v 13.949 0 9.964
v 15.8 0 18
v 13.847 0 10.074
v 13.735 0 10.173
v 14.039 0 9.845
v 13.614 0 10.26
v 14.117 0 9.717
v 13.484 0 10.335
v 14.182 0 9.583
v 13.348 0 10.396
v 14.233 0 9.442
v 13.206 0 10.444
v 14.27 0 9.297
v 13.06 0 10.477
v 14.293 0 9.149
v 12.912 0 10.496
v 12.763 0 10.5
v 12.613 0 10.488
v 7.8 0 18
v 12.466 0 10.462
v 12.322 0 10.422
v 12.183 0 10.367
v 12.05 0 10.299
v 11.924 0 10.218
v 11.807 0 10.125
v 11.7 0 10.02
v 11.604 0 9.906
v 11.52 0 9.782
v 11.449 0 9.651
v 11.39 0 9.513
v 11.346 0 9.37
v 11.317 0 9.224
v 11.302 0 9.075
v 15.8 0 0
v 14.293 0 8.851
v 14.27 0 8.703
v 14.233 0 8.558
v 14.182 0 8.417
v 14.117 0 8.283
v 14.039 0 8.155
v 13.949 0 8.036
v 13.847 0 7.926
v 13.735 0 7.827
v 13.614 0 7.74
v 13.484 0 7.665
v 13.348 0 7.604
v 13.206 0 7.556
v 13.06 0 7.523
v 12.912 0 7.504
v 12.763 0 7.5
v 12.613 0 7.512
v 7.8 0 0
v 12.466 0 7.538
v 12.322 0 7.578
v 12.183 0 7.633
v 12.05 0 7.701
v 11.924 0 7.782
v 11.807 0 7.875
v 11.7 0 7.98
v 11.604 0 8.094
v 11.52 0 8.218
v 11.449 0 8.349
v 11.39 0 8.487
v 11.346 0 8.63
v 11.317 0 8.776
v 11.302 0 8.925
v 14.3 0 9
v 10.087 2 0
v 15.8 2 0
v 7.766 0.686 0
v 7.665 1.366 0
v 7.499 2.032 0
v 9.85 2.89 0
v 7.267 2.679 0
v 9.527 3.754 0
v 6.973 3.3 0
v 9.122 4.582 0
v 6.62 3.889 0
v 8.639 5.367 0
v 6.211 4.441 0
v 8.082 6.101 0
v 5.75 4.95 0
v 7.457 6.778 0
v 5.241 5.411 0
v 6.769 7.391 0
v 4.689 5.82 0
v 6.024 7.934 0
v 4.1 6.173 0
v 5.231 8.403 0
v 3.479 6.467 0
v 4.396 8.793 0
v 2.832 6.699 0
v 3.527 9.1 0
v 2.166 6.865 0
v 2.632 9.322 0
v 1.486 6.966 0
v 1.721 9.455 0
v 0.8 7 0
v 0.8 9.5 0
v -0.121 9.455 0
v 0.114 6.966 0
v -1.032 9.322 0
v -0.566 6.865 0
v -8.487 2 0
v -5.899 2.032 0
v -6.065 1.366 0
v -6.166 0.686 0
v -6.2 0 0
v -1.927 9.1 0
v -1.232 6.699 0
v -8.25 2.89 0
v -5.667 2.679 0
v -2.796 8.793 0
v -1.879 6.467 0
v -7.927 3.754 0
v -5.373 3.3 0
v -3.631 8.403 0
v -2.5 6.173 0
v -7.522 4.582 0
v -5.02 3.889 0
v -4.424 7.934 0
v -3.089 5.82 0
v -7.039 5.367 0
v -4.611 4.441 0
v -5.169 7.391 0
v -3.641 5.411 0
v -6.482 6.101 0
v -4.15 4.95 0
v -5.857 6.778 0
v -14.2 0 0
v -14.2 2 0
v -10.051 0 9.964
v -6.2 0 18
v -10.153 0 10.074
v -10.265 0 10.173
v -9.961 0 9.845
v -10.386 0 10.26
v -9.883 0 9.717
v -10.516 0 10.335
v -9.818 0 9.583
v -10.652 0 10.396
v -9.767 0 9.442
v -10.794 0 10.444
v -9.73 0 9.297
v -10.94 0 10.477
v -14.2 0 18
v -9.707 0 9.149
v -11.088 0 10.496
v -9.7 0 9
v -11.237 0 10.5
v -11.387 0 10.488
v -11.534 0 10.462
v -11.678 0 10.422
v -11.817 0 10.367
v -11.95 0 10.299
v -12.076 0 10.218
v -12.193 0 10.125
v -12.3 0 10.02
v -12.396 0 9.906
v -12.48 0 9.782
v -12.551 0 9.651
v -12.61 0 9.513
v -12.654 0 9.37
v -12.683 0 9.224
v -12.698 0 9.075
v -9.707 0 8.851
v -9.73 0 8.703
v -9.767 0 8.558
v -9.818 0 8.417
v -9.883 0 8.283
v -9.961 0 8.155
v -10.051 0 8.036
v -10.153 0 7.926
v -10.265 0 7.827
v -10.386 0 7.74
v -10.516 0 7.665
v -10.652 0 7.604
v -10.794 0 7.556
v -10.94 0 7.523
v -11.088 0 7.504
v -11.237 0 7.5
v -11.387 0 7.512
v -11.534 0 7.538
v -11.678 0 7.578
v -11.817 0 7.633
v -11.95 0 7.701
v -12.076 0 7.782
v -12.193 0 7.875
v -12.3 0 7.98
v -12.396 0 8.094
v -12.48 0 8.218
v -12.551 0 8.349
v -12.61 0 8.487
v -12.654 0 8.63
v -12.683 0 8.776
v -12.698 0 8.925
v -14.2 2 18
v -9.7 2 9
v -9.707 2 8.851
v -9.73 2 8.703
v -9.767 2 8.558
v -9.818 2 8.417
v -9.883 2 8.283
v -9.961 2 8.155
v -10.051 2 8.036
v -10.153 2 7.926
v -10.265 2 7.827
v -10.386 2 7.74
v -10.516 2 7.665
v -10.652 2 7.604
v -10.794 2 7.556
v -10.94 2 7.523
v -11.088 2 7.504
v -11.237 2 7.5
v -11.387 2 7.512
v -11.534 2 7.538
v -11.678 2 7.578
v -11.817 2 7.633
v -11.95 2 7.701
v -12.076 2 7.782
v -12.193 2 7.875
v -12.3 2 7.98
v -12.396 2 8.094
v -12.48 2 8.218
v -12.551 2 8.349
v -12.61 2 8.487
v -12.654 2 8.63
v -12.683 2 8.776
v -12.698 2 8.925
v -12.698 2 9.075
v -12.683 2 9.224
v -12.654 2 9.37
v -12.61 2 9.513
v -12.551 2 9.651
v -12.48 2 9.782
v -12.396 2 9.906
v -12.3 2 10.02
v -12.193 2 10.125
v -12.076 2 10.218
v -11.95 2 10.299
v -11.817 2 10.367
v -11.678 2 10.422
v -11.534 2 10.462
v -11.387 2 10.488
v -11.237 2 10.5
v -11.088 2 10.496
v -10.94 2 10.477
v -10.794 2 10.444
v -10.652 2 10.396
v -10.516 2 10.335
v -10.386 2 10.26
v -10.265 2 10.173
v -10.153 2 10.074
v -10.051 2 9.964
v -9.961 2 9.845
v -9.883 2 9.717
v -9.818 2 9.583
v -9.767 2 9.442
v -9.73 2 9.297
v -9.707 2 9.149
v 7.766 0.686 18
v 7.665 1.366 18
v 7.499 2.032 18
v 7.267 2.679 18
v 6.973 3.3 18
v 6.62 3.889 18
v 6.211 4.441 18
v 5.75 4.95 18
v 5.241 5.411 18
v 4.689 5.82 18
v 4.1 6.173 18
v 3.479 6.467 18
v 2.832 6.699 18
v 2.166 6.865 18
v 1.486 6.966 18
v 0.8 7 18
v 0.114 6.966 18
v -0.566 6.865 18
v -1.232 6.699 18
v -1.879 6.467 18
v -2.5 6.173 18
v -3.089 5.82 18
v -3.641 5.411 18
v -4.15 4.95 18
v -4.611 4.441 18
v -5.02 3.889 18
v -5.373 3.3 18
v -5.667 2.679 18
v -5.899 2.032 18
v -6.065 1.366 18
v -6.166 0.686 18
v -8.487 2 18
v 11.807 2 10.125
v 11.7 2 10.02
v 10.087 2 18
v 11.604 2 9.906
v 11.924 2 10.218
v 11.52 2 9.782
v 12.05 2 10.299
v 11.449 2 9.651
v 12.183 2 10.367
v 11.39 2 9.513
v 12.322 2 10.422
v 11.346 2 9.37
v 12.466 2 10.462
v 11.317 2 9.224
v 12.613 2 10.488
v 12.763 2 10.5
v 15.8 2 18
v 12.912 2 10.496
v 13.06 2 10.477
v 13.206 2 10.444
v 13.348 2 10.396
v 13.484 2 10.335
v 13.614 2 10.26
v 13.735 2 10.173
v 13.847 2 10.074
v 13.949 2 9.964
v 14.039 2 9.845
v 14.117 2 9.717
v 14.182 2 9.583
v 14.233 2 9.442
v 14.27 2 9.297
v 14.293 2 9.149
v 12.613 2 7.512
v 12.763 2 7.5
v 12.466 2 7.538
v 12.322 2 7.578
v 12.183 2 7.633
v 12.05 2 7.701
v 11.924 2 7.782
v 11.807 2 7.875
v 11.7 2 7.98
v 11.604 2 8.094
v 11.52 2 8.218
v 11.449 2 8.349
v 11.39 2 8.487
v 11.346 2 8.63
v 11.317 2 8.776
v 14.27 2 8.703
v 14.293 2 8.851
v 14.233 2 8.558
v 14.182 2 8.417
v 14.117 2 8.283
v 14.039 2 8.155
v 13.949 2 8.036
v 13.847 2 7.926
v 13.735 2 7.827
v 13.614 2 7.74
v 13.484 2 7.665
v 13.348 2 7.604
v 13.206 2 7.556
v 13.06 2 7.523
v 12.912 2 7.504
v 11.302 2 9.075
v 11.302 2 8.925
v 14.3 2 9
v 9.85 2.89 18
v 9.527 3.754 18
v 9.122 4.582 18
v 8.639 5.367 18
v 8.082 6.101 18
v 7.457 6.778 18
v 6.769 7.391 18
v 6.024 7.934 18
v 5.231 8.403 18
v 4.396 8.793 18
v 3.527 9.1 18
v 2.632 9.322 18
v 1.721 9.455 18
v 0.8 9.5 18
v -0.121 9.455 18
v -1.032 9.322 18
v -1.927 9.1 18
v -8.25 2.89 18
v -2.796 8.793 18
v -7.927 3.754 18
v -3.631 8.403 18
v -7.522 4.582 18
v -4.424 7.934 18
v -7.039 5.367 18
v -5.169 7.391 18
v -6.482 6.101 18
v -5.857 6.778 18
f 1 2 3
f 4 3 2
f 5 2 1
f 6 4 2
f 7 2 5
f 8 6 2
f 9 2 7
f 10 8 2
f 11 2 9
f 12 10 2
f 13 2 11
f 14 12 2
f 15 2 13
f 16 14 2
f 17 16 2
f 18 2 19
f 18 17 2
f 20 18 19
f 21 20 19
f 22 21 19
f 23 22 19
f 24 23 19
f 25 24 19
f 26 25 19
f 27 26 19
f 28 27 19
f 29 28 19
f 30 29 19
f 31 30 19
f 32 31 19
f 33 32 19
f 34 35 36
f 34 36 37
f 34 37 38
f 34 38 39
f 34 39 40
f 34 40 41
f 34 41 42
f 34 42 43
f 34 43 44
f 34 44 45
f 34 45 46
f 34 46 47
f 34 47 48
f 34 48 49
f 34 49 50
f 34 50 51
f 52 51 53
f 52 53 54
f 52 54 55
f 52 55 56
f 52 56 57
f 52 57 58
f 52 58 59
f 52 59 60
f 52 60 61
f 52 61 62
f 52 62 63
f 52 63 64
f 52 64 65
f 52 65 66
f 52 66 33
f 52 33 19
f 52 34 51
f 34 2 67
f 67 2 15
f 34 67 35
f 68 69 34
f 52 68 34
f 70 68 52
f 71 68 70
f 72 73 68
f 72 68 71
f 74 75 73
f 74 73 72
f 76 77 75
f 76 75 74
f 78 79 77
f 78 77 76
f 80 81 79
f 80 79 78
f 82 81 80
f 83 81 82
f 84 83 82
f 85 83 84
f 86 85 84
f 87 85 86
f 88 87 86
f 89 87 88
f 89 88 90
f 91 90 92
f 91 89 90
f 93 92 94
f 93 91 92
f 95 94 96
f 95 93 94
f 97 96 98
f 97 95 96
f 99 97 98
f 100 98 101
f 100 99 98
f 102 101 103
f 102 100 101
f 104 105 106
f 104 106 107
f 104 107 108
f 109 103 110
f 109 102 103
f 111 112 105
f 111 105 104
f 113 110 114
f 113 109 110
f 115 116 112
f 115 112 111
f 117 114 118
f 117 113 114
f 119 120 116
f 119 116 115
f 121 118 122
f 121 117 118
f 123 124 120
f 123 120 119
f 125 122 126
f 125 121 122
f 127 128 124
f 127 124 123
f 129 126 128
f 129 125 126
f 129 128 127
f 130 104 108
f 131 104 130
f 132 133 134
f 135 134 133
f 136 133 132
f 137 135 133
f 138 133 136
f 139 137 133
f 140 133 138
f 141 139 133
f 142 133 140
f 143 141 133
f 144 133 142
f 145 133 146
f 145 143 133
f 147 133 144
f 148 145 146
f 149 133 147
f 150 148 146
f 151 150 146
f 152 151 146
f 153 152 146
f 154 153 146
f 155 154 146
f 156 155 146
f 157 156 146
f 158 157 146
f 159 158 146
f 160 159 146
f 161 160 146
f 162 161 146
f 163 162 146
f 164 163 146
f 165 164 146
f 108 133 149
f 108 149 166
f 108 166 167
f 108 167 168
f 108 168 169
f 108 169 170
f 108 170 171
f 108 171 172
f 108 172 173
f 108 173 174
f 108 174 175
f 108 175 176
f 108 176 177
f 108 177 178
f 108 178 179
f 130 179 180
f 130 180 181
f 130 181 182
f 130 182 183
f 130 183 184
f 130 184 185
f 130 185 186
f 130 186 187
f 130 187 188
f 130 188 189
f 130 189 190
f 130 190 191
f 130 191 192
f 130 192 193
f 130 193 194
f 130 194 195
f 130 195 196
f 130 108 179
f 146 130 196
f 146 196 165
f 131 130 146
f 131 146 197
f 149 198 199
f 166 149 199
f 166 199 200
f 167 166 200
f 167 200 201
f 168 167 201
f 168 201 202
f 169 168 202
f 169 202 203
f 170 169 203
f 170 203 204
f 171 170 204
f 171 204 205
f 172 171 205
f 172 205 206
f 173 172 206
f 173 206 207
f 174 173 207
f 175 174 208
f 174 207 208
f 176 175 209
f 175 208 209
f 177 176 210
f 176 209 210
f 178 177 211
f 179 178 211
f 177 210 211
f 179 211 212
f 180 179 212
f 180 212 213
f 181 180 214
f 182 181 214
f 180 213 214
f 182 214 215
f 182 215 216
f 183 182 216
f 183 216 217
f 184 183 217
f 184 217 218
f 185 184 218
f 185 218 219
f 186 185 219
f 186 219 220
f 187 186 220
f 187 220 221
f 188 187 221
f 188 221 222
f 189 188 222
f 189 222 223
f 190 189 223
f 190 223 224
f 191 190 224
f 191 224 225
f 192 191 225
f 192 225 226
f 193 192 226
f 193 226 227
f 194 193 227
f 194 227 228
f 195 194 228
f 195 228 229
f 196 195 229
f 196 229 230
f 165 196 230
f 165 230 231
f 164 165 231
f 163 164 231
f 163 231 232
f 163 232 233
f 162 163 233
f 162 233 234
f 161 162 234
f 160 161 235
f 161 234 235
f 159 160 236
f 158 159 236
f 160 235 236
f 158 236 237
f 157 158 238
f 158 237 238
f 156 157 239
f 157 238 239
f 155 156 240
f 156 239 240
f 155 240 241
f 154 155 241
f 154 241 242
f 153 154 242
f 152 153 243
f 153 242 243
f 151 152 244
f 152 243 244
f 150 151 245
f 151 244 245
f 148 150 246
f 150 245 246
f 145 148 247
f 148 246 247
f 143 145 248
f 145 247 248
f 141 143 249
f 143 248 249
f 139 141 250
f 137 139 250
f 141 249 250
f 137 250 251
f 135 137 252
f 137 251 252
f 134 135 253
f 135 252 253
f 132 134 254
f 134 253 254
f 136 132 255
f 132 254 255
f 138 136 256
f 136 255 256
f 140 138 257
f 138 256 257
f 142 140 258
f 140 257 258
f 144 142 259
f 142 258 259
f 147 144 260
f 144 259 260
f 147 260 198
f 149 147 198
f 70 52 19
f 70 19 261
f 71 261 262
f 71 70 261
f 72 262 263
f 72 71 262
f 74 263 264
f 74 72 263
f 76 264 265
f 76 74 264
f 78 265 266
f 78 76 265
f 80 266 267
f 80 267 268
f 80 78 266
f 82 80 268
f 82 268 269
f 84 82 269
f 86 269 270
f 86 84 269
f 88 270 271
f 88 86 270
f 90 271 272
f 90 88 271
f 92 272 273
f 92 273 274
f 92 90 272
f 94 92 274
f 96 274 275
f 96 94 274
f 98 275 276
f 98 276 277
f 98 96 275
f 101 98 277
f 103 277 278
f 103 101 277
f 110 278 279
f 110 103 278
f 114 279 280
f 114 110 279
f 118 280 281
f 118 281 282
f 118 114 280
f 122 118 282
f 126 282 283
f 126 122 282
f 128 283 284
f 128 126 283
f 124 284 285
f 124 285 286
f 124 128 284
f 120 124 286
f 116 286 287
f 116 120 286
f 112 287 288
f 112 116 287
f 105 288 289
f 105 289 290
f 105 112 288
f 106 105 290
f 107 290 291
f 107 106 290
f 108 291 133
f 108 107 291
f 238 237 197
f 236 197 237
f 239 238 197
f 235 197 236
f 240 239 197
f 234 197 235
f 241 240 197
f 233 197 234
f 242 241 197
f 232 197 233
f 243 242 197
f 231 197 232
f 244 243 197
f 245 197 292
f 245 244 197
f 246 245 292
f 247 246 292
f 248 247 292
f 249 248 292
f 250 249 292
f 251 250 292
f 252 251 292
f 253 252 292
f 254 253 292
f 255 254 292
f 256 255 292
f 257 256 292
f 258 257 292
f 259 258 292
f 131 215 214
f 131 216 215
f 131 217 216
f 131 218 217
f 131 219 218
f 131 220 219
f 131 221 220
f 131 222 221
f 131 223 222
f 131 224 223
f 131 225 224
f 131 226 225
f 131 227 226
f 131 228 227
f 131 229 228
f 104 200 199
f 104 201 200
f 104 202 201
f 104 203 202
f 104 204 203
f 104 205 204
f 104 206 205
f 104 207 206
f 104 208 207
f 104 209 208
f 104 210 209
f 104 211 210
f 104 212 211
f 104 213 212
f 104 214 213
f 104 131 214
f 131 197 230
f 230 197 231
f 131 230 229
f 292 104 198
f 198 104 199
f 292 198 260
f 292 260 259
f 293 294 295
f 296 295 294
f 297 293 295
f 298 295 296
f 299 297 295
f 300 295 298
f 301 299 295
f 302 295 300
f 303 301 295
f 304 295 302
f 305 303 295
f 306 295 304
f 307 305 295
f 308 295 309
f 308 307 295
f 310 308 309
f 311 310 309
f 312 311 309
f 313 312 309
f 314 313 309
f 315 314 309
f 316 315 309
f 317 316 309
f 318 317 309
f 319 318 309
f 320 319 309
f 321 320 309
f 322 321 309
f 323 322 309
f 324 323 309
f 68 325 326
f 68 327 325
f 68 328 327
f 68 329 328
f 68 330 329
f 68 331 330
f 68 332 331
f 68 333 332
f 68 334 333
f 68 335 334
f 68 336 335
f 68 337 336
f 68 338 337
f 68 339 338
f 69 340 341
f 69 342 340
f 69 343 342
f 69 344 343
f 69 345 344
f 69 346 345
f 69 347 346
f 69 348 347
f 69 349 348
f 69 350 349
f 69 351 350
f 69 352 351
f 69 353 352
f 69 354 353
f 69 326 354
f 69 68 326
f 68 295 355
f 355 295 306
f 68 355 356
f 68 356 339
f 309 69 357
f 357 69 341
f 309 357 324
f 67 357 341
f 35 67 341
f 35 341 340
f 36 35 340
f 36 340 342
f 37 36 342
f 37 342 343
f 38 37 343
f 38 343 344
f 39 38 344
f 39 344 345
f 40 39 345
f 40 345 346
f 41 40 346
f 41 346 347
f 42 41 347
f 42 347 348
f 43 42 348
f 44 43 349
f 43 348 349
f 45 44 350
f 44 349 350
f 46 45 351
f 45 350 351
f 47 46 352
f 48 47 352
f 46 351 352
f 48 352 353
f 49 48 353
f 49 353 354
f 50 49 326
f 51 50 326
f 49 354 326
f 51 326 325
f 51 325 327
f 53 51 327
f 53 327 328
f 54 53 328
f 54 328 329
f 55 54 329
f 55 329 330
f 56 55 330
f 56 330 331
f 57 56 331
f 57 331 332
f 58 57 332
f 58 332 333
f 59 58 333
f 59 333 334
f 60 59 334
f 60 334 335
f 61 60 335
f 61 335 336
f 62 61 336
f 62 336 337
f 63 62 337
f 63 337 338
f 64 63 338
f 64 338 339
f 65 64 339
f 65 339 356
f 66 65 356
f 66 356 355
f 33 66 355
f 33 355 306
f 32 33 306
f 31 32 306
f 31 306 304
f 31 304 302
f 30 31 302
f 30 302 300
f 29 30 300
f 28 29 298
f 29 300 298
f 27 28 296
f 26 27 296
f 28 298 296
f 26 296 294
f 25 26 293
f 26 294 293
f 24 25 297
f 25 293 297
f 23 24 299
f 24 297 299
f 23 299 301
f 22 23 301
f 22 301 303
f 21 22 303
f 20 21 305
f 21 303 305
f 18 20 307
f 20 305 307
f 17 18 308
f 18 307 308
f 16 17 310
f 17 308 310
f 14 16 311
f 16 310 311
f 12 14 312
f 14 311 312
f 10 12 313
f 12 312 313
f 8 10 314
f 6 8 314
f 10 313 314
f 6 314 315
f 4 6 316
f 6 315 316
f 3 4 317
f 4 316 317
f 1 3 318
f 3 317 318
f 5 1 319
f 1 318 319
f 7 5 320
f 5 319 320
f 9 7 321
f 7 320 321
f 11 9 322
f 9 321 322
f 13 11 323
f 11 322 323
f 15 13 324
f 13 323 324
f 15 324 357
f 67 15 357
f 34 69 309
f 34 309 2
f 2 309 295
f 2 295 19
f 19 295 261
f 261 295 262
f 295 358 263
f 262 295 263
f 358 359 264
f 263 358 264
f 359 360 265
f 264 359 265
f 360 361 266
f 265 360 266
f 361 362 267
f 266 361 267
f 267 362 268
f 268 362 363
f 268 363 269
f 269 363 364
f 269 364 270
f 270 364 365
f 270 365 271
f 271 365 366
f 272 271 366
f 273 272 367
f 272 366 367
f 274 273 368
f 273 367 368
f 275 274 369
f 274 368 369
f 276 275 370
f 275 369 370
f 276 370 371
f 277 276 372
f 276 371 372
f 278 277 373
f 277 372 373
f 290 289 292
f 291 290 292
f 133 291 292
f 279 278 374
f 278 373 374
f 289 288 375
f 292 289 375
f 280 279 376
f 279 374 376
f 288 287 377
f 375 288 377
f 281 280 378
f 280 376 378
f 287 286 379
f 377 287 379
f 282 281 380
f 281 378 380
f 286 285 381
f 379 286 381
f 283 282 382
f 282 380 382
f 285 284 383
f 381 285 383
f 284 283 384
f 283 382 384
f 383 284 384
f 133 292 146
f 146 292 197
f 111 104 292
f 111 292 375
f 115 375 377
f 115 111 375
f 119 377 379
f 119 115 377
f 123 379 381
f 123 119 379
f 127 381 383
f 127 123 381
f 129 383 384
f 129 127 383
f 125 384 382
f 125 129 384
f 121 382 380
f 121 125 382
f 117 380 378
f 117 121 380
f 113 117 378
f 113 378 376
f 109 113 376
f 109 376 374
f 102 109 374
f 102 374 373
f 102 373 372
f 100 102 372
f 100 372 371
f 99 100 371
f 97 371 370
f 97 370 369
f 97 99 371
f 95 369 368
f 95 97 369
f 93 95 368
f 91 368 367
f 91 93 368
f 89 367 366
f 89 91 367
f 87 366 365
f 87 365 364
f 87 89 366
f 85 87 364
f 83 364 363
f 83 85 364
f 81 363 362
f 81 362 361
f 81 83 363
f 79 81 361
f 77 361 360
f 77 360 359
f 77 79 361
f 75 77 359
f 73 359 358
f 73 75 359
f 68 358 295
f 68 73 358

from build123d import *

# Parameters (mm, degrees)
RESSALTO_EXTRUS_O1_DEPTH = 18
ESBO_O2_R                = 1.5
CORTE_EXTRUS_O1_DEPTH    = 17


with BuildPart() as part:
    # Esboço1 → Ressalto-extrusão1 (new body)
    with BuildSketch(Plane.XY):
        with BuildLine():
            Line((10.087087811, 2), (15.8, 2))
            Line((15.8, 2), (15.8, 0))
            Line((15.8, 0), (7.8, 0))
            ThreePointArc((7.8, 0), (0.8, 7), (-6.2, 0))
            Line((-6.2, 0), (-14.2, 0))
            Line((-14.2, 0), (-14.2, 2))
            Line((-14.2, 2), (-8.487087811, 2))
            ThreePointArc((-8.487087811, 2), (0.8, 9.5), (10.087087811, 2))
        make_face()
    extrude(amount=RESSALTO_EXTRUS_O1_DEPTH)

    # Esboço2 → Corte-extrusão1 (cut)
    with BuildSketch(Plane(origin=(0, 2, 0), x_dir=(1, 0, 0), z_dir=(0, 1, 0))):
        with Locations((12.8, -9)):
            Circle(ESBO_O2_R)
        with Locations((-11.2, -9)):
            Circle(ESBO_O2_R)
    extrude(amount=-CORTE_EXTRUS_O1_DEPTH, mode=Mode.SUBTRACT)


solid = part.part
